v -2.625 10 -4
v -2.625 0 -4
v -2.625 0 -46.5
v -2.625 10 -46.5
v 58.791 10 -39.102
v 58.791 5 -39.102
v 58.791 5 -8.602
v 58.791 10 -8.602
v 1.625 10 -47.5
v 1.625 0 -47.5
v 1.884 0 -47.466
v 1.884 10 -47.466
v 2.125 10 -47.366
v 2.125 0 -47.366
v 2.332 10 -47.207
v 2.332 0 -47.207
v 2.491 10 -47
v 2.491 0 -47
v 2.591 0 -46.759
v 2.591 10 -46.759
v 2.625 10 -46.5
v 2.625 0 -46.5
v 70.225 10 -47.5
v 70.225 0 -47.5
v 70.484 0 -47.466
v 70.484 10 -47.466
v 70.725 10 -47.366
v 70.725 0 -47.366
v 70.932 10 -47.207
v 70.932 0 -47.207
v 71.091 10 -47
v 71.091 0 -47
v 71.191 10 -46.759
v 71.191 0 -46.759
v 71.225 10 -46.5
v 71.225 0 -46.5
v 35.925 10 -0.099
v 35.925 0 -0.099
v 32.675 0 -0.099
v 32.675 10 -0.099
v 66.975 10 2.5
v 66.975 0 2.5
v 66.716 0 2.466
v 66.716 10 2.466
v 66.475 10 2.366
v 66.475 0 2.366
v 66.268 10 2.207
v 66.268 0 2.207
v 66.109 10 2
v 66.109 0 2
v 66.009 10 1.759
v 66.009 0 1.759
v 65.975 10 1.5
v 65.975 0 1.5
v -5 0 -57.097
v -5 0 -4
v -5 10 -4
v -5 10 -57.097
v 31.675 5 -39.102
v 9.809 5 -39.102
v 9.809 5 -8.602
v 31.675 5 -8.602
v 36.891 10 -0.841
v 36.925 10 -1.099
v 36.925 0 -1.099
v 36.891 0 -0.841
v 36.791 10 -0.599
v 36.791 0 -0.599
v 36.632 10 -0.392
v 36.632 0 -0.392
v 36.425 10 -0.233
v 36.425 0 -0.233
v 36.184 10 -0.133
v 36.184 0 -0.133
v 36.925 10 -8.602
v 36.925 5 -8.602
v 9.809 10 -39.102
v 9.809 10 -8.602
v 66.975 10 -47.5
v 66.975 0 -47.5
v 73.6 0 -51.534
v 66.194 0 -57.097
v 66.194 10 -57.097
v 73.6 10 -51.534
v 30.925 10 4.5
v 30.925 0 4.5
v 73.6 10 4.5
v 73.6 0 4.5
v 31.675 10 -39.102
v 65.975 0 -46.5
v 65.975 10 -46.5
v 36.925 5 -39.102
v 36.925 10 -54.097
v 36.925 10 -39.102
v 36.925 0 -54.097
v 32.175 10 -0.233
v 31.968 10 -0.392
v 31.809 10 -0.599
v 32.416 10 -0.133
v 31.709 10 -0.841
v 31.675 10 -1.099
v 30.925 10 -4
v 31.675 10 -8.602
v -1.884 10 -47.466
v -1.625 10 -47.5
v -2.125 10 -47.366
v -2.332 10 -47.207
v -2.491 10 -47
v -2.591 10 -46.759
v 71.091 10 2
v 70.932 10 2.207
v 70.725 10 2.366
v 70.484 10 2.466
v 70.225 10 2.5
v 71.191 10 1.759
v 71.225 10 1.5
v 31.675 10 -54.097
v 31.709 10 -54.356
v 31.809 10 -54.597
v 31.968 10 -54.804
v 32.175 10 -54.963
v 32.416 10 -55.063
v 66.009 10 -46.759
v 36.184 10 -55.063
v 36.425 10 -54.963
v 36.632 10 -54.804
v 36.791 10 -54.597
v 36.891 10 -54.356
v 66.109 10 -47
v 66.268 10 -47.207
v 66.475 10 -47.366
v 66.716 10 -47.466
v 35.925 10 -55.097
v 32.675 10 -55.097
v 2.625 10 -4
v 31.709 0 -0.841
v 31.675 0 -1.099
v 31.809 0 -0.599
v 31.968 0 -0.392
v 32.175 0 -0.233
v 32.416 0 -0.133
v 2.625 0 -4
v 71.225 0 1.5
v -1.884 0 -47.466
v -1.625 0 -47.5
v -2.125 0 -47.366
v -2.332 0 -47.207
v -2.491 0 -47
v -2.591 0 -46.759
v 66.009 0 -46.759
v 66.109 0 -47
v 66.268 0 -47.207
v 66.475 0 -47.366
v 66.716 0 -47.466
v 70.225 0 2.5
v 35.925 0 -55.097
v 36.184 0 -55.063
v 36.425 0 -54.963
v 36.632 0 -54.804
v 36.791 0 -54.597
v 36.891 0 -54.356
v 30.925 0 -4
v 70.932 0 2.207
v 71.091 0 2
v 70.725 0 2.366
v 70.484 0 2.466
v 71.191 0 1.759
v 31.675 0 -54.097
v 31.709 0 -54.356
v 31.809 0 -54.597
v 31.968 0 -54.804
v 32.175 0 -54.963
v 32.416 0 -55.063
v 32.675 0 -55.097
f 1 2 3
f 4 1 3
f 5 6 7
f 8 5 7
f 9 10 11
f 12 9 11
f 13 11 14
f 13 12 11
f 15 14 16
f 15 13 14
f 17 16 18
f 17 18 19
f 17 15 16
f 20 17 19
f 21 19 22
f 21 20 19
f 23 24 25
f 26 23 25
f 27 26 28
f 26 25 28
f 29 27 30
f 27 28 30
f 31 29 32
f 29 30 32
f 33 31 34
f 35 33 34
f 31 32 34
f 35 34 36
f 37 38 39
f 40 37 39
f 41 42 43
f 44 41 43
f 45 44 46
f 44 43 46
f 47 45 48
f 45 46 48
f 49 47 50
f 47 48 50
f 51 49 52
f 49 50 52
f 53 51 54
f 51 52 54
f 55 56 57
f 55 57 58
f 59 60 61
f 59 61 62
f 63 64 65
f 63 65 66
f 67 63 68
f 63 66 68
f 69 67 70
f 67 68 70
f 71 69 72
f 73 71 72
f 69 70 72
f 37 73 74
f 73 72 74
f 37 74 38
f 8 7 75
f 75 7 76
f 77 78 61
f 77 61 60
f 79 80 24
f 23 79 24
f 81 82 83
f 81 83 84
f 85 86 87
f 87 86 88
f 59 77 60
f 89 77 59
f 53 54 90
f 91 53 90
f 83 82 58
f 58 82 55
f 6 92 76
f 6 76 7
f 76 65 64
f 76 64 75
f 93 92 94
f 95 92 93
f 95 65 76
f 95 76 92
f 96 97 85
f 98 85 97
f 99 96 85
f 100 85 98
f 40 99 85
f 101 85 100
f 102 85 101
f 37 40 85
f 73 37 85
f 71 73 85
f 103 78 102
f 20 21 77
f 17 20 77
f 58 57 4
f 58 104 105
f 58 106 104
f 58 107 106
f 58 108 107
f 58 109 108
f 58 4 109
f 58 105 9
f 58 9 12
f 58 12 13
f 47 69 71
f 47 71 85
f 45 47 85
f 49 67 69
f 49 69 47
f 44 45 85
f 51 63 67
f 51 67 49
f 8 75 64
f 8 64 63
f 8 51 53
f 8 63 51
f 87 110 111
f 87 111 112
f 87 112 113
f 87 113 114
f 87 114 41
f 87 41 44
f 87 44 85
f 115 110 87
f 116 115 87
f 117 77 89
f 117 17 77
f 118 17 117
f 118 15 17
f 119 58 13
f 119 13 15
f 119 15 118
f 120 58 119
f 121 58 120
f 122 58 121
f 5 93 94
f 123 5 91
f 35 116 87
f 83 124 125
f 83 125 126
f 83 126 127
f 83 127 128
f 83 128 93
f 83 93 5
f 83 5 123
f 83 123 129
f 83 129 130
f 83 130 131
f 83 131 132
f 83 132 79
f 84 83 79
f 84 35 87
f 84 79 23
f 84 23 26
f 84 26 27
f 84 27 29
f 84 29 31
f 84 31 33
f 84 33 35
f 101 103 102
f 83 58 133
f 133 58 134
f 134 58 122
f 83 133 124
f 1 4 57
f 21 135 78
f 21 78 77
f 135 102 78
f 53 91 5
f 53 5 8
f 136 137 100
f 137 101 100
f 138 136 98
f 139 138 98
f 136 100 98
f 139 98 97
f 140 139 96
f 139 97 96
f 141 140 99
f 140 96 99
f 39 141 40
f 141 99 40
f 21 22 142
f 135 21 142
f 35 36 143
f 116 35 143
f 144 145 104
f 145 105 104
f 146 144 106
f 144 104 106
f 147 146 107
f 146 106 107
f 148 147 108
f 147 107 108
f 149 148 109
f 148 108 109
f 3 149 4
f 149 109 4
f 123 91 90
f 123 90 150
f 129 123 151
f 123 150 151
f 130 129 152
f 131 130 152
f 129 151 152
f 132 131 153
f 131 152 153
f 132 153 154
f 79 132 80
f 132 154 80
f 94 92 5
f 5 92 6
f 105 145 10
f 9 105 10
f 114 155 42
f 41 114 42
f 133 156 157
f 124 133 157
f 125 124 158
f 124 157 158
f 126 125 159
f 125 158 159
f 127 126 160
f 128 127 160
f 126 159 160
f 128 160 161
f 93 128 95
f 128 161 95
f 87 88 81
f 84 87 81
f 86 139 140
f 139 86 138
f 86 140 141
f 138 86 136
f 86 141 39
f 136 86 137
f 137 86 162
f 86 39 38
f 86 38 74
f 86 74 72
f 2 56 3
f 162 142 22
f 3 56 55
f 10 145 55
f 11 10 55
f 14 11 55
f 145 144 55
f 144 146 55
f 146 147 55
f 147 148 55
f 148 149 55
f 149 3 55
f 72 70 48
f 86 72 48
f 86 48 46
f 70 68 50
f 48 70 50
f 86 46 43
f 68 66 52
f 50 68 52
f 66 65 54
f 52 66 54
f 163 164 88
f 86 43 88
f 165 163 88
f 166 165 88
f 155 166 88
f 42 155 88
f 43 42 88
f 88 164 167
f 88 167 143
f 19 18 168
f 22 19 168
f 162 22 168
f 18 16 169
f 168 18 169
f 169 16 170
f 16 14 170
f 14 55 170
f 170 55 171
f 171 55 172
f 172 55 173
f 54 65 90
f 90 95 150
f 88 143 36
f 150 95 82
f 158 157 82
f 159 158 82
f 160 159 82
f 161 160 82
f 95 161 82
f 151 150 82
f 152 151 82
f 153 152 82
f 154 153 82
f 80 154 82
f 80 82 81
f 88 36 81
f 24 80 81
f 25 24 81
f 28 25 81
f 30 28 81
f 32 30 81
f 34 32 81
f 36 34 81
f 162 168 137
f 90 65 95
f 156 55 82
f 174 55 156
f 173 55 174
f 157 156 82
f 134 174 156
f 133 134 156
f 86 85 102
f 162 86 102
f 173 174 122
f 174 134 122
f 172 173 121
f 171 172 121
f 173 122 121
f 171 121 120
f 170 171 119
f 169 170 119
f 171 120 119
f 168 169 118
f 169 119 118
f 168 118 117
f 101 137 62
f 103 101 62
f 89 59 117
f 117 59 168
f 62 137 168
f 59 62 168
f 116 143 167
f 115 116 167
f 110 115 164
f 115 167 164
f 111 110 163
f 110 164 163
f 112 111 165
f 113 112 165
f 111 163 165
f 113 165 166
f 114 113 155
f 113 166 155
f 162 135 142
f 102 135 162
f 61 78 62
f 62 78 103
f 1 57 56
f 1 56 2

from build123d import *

# Parameters (mm, degrees)
BOSS_EXTRUDE1_DEPTH = 10
FILLET1_R           = 1
SKETCH2_W           = 21.86553483
SKETCH2_H           = 30.5
CUT_EXTRUDE1_DEPTH  = 5
MIRROR1_DEPTH       = 10
MIRROR1_2_OUTLINE_W = 21.86553483
MIRROR1_2_OUTLINE_H = 30.5
MIRROR1_2_DEPTH     = 5
SKETCH6_W           = 35.925
SKETCH6_H           = 8.5
CUT_EXTRUDE2_DEPTH  = 10


# Read off the part's stored shape, not the designer's step: Mirror1
with BuildPart() as part:
    # Sketch1 → Boss-Extrude1 (new body)
    with BuildSketch(Plane(origin=(0, 0, 0), x_dir=(1, 0, 0), z_dir=(0, 1, 0))):
        Polygon((-5, 57.097150921), (34.3, 57.097150921), (34.3, 55.097150921), (31.675, 55.097150921), (31.675, 52.597150921), (31.675, 2.599340873), (31.675, 0.099340873), (34.3, 0.099340873), (34.3, -4.5), (-5, -4.5), align=None)
        Polygon((-2.625, 45), (-2.625, 0), (-2.625, -2.5), (0, -2.5), (2.625, -2.5), (2.625, 0), (2.625, 45), (2.625, 47.5), (0, 47.5), (-2.625, 47.5), align=None, mode=Mode.SUBTRACT)
    extrude(amount=BOSS_EXTRUDE1_DEPTH)

    # Fillet1
    fillet1_edges = [part.edges().sort_by_distance(p)[0] for p in [
        (31.675, 5, -55.097150921),
        (31.675, 5, -0.099340873),
        (-2.625, 5, -47.5),
        (-2.625, 5, 2.5),
        (2.625, 5, 2.5),
        (2.625, 5, -47.5),
    ]]
    fillet(fillet1_edges, radius=FILLET1_R)

    # Sketch2 → Cut-Extrude1 (cut)
    with BuildSketch(Plane(origin=(0, 10, 0), x_dir=(1, 0, 0), z_dir=(0, 1, 0))):
        with Locations((20.742232585, 23.8519351)):
            Rectangle(SKETCH2_W, SKETCH2_H)
    extrude(amount=-CUT_EXTRUDE1_DEPTH, mode=Mode.SUBTRACT)

    # Mirror1 outline → Mirror1 (add)
    with BuildSketch(Plane(origin=(0, 0, 0), x_dir=(1, 0, 0), z_dir=(0, 1, 0))):
        with BuildLine():
            ThreePointArc((35.925, 55.097150921), (36.632106781, 54.804257702), (36.925, 54.097150921))
            Line((36.925, 54.097150921), (36.925, 39.1019351))
            Line((36.925, 39.1019351), (58.79053483, 39.1019351))
            Line((58.79053483, 39.1019351), (58.79053483, 8.6019351))
            Line((58.79053483, 8.6019351), (36.925, 8.6019351))
            Line((36.925, 8.6019351), (36.925, 1.099340873))
            ThreePointArc((36.925, 1.099340873), (36.632106781, 0.392234092), (35.925, 0.099340873))
            Line((35.925, 0.099340873), (34.3, 0.099340873))
            Line((34.3, 0.099340873), (34.3, -4.5))
            Line((34.3, -4.5), (73.6, -4.5))
            Line((73.6, -4.5), (73.6, 57.097150921))
            Line((73.6, 57.097150921), (34.3, 57.097150921))
            Line((34.3, 57.097150921), (34.3, 55.097150921))
            Line((34.3, 55.097150921), (35.925, 55.097150921))
        make_face()
        with BuildLine():
            Line((70.225, -2.5), (66.975, -2.5))
            ThreePointArc((66.975, -2.5), (66.267893219, -2.207106781), (65.975, -1.5))
            Line((65.975, -1.5), (65.975, 46.5))
            ThreePointArc((65.975, 46.5), (66.267893219, 47.207106781), (66.975, 47.5))
            Line((66.975, 47.5), (70.225, 47.5))
            ThreePointArc((70.225, 47.5), (70.932106781, 47.207106781), (71.225, 46.5))
            Line((71.225, 46.5), (71.225, -1.5))
            ThreePointArc((71.225, -1.5), (70.932106781, -2.207106781), (70.225, -2.5))
        make_face(mode=Mode.SUBTRACT)
    extrude(amount=MIRROR1_DEPTH)

    # Mirror1 2 outline → Mirror1 2 (add)
    with BuildSketch(Plane(origin=(0, 0, 0), x_dir=(1, 0, 0), z_dir=(0, 1, 0))):
        with Locations((47.857767415, 23.8519351)):
            Rectangle(MIRROR1_2_OUTLINE_W, MIRROR1_2_OUTLINE_H)
    extrude(amount=MIRROR1_2_DEPTH)

    # Sketch6 → Cut-Extrude2 (cut)
    with BuildSketch(Plane(origin=(0, 10, 0), x_dir=(1, 0, 0), z_dir=(0, 1, 0))):
        with Locations((12.9625, -0.25)):
            Rectangle(SKETCH6_W, SKETCH6_H)
        Polygon((73.6, 57.097150921), (66.19379908, 57.097150921), (73.6, 51.534362721), align=None)
    extrude(amount=-CUT_EXTRUDE2_DEPTH, mode=Mode.SUBTRACT)


solid = part.part
